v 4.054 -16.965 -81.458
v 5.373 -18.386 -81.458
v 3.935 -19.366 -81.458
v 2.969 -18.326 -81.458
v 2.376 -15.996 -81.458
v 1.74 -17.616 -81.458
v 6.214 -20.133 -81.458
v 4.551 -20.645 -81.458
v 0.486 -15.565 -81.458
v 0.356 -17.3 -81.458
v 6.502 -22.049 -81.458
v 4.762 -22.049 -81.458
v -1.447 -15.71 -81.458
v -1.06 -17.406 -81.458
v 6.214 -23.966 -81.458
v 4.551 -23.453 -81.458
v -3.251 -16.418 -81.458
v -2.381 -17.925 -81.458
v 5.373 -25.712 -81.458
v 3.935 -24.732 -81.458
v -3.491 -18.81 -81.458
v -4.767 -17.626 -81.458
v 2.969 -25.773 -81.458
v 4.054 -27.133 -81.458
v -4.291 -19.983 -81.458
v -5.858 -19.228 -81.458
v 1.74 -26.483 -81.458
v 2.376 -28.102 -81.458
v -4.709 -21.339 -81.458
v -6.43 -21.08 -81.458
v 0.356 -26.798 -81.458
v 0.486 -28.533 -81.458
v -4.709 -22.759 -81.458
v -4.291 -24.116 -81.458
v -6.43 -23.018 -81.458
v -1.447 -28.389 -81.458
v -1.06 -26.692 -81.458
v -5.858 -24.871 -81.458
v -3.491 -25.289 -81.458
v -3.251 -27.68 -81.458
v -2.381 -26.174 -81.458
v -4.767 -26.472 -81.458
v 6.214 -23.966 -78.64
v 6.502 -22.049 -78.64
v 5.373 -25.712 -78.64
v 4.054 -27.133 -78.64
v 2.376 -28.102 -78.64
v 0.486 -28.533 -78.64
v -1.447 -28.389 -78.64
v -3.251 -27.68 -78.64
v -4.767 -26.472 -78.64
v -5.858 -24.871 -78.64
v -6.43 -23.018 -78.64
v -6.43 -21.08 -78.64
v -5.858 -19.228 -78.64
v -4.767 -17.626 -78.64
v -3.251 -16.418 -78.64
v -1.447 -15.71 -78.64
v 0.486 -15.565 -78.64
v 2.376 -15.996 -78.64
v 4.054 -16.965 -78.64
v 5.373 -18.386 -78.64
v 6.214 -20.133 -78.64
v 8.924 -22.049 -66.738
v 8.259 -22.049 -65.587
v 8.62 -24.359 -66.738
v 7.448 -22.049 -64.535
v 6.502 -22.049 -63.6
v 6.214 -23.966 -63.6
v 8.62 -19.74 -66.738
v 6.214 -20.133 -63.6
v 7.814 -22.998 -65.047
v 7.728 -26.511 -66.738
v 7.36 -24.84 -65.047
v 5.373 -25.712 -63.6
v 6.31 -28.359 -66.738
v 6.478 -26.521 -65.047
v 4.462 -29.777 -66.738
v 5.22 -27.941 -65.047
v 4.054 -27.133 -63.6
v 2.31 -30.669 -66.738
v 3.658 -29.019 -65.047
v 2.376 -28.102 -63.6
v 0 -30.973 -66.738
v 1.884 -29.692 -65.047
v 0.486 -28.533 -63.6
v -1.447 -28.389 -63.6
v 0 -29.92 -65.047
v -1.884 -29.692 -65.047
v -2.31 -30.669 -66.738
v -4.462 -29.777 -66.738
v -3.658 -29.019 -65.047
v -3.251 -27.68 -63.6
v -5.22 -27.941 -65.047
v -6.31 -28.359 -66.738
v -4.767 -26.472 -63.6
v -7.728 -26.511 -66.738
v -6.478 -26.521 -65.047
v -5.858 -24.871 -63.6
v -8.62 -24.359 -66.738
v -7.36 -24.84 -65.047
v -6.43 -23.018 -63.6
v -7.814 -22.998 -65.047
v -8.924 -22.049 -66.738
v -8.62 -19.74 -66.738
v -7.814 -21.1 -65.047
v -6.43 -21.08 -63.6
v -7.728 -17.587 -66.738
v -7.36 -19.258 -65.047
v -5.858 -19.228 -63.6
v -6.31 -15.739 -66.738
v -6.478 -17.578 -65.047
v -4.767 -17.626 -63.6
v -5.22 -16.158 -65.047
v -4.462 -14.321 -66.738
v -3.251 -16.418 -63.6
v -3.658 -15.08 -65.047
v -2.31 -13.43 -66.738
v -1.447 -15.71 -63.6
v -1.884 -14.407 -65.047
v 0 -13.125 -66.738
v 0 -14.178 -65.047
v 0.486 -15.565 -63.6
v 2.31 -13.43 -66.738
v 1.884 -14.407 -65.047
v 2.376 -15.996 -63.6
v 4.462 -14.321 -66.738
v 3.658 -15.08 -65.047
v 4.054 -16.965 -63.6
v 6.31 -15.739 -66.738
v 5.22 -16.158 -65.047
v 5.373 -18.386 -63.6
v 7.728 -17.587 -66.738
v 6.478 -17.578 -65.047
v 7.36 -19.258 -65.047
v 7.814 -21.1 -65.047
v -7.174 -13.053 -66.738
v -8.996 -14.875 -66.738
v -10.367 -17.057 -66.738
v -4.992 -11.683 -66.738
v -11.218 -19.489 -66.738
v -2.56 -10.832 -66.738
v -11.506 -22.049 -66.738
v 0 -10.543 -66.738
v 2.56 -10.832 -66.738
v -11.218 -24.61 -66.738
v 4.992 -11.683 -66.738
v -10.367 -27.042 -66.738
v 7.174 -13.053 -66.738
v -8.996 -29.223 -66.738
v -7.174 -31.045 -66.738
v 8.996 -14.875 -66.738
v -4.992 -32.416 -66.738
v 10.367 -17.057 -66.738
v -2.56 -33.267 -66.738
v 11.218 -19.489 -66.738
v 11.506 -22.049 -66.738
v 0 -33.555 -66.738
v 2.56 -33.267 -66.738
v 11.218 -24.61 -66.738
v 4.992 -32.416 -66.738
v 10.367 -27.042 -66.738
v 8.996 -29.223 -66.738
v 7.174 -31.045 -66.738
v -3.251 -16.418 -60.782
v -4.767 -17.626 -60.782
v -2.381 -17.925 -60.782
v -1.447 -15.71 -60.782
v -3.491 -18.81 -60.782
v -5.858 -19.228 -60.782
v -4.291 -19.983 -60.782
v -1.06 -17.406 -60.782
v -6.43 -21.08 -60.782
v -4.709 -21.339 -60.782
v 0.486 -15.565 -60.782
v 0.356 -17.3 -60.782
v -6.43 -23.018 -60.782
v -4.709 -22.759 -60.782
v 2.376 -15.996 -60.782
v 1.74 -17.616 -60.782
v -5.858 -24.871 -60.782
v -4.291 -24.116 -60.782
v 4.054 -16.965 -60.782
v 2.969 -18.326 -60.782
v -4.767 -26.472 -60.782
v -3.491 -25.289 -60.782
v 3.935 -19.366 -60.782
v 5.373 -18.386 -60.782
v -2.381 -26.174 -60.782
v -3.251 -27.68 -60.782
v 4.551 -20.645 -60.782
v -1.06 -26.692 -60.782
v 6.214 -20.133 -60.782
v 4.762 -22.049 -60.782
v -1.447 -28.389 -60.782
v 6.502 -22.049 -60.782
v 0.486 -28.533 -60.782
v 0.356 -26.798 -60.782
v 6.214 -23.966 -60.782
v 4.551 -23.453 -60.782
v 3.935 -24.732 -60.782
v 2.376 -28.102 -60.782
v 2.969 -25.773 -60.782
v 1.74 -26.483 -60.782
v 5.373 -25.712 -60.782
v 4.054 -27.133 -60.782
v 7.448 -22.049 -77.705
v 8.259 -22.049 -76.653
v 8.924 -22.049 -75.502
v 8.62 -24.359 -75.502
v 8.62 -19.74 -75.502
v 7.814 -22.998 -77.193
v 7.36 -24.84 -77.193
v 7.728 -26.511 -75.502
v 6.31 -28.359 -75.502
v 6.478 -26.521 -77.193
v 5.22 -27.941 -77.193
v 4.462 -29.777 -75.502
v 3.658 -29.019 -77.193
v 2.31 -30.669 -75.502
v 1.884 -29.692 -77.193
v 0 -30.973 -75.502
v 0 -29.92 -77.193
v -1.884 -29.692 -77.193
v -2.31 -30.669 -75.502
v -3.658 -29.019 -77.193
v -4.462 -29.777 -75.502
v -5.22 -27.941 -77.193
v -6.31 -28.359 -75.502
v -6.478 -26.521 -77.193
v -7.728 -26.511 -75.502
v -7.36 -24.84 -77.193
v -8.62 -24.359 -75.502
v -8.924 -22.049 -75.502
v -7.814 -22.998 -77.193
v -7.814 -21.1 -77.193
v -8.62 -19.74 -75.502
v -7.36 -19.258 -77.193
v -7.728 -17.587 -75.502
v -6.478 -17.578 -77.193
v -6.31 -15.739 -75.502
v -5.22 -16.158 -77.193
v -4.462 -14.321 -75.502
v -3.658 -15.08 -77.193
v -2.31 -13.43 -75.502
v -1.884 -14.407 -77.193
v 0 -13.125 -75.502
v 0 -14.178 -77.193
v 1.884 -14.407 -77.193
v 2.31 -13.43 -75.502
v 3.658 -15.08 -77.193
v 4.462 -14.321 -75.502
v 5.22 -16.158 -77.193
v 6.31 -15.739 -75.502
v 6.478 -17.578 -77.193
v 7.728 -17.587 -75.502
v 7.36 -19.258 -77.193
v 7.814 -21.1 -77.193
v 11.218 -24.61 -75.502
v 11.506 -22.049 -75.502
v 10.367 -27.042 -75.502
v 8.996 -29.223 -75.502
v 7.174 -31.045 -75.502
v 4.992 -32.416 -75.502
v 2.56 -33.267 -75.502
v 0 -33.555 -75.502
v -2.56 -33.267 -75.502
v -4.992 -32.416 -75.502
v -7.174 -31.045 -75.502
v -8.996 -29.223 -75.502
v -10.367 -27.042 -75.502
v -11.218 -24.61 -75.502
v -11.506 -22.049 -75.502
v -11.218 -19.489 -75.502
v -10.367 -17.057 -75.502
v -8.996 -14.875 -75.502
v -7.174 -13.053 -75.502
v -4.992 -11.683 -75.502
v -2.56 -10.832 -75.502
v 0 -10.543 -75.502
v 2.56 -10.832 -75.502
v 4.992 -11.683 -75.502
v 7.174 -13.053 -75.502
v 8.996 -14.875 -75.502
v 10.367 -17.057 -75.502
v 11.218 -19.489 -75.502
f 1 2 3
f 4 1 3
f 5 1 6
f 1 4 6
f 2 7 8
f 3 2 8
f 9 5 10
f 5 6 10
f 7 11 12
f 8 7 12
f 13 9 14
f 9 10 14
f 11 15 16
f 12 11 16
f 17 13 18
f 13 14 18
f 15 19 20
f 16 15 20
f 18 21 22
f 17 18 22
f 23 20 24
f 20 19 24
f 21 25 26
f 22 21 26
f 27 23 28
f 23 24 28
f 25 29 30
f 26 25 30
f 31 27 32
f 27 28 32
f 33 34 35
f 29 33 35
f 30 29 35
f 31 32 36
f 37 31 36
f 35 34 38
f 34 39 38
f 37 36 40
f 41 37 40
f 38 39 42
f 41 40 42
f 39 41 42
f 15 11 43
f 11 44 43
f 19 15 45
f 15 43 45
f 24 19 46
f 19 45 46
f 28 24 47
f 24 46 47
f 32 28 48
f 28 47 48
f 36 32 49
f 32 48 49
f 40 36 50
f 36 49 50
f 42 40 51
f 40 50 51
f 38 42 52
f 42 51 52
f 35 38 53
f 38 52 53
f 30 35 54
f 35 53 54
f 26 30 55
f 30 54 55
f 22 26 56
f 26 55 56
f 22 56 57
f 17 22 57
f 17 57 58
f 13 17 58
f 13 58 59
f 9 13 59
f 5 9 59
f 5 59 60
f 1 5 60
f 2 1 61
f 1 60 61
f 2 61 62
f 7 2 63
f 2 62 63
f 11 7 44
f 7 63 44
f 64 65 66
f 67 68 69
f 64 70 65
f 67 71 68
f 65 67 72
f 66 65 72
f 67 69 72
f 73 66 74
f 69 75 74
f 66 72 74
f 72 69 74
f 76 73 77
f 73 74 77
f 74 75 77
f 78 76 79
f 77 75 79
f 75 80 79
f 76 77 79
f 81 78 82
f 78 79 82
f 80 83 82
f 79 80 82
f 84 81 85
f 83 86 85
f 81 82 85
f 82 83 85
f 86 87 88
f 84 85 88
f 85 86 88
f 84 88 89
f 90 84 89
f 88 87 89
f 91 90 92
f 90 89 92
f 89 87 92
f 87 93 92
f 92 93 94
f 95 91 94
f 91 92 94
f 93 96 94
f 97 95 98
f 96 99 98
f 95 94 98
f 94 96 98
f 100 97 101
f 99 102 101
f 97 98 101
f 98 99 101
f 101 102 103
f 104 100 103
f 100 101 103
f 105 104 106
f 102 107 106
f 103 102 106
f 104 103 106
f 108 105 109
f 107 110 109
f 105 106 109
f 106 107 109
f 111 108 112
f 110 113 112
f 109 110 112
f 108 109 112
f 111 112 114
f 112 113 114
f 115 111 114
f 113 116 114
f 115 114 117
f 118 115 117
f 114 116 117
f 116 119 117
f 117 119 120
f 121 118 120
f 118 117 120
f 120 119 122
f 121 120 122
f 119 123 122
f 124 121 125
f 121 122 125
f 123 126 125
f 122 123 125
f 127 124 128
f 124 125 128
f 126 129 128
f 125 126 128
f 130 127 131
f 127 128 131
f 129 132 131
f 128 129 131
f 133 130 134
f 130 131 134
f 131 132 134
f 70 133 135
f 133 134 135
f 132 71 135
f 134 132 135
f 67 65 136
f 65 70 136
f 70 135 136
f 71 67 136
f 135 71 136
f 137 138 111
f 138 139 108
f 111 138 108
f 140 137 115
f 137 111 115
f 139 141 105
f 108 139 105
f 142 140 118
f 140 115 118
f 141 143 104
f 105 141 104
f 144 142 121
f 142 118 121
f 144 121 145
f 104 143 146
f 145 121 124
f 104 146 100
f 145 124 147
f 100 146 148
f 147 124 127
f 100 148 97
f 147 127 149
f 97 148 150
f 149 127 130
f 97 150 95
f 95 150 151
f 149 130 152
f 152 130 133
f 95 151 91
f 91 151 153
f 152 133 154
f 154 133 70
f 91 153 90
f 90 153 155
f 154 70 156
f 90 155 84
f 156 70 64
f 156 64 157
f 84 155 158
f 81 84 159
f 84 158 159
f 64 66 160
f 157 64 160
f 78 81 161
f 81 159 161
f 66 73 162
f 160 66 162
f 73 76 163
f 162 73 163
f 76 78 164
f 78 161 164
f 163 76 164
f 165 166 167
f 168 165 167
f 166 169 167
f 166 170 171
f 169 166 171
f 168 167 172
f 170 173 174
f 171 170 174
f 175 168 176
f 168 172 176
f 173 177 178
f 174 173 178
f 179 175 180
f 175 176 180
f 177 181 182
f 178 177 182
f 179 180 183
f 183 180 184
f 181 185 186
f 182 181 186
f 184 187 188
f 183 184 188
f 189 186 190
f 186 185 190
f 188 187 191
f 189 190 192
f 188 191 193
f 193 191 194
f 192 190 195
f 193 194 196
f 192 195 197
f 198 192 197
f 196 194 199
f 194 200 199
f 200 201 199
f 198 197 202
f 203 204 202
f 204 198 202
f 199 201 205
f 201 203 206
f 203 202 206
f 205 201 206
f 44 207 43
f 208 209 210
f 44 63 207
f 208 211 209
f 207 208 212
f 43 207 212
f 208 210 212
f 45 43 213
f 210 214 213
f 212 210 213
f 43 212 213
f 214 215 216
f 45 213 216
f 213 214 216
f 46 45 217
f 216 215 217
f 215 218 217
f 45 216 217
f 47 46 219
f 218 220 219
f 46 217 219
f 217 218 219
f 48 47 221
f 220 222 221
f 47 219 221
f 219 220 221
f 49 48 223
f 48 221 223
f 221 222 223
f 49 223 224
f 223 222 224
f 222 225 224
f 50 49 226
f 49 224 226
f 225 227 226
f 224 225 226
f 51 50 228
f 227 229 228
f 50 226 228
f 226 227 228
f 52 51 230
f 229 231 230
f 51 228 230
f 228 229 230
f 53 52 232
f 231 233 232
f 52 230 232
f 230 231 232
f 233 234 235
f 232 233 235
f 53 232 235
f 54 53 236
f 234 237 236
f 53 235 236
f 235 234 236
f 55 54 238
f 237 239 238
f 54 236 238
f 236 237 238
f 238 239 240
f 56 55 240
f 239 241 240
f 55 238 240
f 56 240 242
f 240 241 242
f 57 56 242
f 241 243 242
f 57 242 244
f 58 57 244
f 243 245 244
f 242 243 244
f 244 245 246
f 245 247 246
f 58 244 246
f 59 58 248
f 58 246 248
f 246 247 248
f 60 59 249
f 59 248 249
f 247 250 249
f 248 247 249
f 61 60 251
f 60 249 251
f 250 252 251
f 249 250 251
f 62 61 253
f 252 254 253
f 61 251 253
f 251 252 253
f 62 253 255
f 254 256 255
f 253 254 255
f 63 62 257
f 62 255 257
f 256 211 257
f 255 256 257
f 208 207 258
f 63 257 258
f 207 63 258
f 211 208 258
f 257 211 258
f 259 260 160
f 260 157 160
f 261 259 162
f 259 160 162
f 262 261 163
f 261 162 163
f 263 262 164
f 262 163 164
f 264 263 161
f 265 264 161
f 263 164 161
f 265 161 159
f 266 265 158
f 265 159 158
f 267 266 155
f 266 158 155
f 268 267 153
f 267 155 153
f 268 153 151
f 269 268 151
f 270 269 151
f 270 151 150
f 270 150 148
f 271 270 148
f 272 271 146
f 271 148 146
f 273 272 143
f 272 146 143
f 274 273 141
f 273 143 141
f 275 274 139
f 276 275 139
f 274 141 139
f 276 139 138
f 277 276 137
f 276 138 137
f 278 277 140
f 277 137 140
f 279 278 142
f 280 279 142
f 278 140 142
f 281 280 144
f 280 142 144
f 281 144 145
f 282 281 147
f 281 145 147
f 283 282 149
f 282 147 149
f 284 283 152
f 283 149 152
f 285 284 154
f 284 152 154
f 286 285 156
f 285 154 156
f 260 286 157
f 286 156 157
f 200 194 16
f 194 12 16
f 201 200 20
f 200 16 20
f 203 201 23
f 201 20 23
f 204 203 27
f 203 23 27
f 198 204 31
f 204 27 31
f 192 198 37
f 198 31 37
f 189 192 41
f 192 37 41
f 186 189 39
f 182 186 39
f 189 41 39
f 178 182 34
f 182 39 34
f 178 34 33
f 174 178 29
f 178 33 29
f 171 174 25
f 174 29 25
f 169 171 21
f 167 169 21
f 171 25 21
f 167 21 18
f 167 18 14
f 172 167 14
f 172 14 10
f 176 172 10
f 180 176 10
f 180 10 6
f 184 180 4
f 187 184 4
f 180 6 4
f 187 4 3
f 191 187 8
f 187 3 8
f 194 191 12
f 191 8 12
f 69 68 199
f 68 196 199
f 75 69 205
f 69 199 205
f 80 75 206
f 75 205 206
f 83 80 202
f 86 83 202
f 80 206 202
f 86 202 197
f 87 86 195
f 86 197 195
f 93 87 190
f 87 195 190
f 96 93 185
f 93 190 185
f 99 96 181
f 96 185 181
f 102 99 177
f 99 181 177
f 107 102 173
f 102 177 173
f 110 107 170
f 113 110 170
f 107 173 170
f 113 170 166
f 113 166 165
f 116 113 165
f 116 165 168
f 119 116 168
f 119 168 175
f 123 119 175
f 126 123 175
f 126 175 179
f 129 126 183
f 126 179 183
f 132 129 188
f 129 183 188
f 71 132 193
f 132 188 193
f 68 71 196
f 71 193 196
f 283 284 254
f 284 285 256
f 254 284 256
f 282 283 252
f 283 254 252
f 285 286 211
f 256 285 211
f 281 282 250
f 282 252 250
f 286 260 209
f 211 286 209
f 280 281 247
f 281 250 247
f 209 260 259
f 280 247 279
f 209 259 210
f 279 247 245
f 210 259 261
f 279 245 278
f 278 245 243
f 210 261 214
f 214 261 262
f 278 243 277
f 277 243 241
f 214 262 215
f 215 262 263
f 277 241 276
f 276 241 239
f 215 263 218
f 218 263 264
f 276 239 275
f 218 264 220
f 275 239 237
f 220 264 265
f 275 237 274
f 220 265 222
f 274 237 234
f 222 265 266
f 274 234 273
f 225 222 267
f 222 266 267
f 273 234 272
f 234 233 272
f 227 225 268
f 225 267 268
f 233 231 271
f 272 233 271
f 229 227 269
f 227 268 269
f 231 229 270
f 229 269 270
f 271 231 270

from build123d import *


with BuildPart() as part:
    # Sketch1 → Revolve1 (revolve)
    with BuildSketch(Plane(origin=(0, 0, 0), x_dir=(0, 0, -1), z_dir=(1, 0, 0)), mode=Mode.PRIVATE) as revolve1_sk:
        with BuildLine():
            Line((60.7822, -26.811732), (81.4578, -26.811732))
            Line((81.4578, -26.811732), (81.4578, -28.551632))
            Line((81.4578, -28.551632), (78.639993039, -28.551632))
            ThreePointArc((78.639993039, -28.551632), (77.1926569, -29.920339878), (75.5015, -30.973018125))
            Line((75.5015, -30.973018125), (75.5015, -33.555432))
            Line((75.5015, -33.555432), (66.7385, -33.555432))
            Line((66.7385, -33.555432), (66.7385, -30.973018125))
            ThreePointArc((66.7385, -30.973018125), (65.0473431, -29.920339878), (63.600006961, -28.551632))
            Line((63.600006961, -28.551632), (60.7822, -28.551632))
            Line((60.7822, -28.551632), (60.7822, -26.811732))
        make_face()
    revolve(revolve1_sk.sketch.rotate(Axis((0, -22.049232, -82.136173087), (0, 0, -1)), 270), axis=Axis((0, -22.049232, -82.136173087), (0, 0, -1)))


solid = part.part
